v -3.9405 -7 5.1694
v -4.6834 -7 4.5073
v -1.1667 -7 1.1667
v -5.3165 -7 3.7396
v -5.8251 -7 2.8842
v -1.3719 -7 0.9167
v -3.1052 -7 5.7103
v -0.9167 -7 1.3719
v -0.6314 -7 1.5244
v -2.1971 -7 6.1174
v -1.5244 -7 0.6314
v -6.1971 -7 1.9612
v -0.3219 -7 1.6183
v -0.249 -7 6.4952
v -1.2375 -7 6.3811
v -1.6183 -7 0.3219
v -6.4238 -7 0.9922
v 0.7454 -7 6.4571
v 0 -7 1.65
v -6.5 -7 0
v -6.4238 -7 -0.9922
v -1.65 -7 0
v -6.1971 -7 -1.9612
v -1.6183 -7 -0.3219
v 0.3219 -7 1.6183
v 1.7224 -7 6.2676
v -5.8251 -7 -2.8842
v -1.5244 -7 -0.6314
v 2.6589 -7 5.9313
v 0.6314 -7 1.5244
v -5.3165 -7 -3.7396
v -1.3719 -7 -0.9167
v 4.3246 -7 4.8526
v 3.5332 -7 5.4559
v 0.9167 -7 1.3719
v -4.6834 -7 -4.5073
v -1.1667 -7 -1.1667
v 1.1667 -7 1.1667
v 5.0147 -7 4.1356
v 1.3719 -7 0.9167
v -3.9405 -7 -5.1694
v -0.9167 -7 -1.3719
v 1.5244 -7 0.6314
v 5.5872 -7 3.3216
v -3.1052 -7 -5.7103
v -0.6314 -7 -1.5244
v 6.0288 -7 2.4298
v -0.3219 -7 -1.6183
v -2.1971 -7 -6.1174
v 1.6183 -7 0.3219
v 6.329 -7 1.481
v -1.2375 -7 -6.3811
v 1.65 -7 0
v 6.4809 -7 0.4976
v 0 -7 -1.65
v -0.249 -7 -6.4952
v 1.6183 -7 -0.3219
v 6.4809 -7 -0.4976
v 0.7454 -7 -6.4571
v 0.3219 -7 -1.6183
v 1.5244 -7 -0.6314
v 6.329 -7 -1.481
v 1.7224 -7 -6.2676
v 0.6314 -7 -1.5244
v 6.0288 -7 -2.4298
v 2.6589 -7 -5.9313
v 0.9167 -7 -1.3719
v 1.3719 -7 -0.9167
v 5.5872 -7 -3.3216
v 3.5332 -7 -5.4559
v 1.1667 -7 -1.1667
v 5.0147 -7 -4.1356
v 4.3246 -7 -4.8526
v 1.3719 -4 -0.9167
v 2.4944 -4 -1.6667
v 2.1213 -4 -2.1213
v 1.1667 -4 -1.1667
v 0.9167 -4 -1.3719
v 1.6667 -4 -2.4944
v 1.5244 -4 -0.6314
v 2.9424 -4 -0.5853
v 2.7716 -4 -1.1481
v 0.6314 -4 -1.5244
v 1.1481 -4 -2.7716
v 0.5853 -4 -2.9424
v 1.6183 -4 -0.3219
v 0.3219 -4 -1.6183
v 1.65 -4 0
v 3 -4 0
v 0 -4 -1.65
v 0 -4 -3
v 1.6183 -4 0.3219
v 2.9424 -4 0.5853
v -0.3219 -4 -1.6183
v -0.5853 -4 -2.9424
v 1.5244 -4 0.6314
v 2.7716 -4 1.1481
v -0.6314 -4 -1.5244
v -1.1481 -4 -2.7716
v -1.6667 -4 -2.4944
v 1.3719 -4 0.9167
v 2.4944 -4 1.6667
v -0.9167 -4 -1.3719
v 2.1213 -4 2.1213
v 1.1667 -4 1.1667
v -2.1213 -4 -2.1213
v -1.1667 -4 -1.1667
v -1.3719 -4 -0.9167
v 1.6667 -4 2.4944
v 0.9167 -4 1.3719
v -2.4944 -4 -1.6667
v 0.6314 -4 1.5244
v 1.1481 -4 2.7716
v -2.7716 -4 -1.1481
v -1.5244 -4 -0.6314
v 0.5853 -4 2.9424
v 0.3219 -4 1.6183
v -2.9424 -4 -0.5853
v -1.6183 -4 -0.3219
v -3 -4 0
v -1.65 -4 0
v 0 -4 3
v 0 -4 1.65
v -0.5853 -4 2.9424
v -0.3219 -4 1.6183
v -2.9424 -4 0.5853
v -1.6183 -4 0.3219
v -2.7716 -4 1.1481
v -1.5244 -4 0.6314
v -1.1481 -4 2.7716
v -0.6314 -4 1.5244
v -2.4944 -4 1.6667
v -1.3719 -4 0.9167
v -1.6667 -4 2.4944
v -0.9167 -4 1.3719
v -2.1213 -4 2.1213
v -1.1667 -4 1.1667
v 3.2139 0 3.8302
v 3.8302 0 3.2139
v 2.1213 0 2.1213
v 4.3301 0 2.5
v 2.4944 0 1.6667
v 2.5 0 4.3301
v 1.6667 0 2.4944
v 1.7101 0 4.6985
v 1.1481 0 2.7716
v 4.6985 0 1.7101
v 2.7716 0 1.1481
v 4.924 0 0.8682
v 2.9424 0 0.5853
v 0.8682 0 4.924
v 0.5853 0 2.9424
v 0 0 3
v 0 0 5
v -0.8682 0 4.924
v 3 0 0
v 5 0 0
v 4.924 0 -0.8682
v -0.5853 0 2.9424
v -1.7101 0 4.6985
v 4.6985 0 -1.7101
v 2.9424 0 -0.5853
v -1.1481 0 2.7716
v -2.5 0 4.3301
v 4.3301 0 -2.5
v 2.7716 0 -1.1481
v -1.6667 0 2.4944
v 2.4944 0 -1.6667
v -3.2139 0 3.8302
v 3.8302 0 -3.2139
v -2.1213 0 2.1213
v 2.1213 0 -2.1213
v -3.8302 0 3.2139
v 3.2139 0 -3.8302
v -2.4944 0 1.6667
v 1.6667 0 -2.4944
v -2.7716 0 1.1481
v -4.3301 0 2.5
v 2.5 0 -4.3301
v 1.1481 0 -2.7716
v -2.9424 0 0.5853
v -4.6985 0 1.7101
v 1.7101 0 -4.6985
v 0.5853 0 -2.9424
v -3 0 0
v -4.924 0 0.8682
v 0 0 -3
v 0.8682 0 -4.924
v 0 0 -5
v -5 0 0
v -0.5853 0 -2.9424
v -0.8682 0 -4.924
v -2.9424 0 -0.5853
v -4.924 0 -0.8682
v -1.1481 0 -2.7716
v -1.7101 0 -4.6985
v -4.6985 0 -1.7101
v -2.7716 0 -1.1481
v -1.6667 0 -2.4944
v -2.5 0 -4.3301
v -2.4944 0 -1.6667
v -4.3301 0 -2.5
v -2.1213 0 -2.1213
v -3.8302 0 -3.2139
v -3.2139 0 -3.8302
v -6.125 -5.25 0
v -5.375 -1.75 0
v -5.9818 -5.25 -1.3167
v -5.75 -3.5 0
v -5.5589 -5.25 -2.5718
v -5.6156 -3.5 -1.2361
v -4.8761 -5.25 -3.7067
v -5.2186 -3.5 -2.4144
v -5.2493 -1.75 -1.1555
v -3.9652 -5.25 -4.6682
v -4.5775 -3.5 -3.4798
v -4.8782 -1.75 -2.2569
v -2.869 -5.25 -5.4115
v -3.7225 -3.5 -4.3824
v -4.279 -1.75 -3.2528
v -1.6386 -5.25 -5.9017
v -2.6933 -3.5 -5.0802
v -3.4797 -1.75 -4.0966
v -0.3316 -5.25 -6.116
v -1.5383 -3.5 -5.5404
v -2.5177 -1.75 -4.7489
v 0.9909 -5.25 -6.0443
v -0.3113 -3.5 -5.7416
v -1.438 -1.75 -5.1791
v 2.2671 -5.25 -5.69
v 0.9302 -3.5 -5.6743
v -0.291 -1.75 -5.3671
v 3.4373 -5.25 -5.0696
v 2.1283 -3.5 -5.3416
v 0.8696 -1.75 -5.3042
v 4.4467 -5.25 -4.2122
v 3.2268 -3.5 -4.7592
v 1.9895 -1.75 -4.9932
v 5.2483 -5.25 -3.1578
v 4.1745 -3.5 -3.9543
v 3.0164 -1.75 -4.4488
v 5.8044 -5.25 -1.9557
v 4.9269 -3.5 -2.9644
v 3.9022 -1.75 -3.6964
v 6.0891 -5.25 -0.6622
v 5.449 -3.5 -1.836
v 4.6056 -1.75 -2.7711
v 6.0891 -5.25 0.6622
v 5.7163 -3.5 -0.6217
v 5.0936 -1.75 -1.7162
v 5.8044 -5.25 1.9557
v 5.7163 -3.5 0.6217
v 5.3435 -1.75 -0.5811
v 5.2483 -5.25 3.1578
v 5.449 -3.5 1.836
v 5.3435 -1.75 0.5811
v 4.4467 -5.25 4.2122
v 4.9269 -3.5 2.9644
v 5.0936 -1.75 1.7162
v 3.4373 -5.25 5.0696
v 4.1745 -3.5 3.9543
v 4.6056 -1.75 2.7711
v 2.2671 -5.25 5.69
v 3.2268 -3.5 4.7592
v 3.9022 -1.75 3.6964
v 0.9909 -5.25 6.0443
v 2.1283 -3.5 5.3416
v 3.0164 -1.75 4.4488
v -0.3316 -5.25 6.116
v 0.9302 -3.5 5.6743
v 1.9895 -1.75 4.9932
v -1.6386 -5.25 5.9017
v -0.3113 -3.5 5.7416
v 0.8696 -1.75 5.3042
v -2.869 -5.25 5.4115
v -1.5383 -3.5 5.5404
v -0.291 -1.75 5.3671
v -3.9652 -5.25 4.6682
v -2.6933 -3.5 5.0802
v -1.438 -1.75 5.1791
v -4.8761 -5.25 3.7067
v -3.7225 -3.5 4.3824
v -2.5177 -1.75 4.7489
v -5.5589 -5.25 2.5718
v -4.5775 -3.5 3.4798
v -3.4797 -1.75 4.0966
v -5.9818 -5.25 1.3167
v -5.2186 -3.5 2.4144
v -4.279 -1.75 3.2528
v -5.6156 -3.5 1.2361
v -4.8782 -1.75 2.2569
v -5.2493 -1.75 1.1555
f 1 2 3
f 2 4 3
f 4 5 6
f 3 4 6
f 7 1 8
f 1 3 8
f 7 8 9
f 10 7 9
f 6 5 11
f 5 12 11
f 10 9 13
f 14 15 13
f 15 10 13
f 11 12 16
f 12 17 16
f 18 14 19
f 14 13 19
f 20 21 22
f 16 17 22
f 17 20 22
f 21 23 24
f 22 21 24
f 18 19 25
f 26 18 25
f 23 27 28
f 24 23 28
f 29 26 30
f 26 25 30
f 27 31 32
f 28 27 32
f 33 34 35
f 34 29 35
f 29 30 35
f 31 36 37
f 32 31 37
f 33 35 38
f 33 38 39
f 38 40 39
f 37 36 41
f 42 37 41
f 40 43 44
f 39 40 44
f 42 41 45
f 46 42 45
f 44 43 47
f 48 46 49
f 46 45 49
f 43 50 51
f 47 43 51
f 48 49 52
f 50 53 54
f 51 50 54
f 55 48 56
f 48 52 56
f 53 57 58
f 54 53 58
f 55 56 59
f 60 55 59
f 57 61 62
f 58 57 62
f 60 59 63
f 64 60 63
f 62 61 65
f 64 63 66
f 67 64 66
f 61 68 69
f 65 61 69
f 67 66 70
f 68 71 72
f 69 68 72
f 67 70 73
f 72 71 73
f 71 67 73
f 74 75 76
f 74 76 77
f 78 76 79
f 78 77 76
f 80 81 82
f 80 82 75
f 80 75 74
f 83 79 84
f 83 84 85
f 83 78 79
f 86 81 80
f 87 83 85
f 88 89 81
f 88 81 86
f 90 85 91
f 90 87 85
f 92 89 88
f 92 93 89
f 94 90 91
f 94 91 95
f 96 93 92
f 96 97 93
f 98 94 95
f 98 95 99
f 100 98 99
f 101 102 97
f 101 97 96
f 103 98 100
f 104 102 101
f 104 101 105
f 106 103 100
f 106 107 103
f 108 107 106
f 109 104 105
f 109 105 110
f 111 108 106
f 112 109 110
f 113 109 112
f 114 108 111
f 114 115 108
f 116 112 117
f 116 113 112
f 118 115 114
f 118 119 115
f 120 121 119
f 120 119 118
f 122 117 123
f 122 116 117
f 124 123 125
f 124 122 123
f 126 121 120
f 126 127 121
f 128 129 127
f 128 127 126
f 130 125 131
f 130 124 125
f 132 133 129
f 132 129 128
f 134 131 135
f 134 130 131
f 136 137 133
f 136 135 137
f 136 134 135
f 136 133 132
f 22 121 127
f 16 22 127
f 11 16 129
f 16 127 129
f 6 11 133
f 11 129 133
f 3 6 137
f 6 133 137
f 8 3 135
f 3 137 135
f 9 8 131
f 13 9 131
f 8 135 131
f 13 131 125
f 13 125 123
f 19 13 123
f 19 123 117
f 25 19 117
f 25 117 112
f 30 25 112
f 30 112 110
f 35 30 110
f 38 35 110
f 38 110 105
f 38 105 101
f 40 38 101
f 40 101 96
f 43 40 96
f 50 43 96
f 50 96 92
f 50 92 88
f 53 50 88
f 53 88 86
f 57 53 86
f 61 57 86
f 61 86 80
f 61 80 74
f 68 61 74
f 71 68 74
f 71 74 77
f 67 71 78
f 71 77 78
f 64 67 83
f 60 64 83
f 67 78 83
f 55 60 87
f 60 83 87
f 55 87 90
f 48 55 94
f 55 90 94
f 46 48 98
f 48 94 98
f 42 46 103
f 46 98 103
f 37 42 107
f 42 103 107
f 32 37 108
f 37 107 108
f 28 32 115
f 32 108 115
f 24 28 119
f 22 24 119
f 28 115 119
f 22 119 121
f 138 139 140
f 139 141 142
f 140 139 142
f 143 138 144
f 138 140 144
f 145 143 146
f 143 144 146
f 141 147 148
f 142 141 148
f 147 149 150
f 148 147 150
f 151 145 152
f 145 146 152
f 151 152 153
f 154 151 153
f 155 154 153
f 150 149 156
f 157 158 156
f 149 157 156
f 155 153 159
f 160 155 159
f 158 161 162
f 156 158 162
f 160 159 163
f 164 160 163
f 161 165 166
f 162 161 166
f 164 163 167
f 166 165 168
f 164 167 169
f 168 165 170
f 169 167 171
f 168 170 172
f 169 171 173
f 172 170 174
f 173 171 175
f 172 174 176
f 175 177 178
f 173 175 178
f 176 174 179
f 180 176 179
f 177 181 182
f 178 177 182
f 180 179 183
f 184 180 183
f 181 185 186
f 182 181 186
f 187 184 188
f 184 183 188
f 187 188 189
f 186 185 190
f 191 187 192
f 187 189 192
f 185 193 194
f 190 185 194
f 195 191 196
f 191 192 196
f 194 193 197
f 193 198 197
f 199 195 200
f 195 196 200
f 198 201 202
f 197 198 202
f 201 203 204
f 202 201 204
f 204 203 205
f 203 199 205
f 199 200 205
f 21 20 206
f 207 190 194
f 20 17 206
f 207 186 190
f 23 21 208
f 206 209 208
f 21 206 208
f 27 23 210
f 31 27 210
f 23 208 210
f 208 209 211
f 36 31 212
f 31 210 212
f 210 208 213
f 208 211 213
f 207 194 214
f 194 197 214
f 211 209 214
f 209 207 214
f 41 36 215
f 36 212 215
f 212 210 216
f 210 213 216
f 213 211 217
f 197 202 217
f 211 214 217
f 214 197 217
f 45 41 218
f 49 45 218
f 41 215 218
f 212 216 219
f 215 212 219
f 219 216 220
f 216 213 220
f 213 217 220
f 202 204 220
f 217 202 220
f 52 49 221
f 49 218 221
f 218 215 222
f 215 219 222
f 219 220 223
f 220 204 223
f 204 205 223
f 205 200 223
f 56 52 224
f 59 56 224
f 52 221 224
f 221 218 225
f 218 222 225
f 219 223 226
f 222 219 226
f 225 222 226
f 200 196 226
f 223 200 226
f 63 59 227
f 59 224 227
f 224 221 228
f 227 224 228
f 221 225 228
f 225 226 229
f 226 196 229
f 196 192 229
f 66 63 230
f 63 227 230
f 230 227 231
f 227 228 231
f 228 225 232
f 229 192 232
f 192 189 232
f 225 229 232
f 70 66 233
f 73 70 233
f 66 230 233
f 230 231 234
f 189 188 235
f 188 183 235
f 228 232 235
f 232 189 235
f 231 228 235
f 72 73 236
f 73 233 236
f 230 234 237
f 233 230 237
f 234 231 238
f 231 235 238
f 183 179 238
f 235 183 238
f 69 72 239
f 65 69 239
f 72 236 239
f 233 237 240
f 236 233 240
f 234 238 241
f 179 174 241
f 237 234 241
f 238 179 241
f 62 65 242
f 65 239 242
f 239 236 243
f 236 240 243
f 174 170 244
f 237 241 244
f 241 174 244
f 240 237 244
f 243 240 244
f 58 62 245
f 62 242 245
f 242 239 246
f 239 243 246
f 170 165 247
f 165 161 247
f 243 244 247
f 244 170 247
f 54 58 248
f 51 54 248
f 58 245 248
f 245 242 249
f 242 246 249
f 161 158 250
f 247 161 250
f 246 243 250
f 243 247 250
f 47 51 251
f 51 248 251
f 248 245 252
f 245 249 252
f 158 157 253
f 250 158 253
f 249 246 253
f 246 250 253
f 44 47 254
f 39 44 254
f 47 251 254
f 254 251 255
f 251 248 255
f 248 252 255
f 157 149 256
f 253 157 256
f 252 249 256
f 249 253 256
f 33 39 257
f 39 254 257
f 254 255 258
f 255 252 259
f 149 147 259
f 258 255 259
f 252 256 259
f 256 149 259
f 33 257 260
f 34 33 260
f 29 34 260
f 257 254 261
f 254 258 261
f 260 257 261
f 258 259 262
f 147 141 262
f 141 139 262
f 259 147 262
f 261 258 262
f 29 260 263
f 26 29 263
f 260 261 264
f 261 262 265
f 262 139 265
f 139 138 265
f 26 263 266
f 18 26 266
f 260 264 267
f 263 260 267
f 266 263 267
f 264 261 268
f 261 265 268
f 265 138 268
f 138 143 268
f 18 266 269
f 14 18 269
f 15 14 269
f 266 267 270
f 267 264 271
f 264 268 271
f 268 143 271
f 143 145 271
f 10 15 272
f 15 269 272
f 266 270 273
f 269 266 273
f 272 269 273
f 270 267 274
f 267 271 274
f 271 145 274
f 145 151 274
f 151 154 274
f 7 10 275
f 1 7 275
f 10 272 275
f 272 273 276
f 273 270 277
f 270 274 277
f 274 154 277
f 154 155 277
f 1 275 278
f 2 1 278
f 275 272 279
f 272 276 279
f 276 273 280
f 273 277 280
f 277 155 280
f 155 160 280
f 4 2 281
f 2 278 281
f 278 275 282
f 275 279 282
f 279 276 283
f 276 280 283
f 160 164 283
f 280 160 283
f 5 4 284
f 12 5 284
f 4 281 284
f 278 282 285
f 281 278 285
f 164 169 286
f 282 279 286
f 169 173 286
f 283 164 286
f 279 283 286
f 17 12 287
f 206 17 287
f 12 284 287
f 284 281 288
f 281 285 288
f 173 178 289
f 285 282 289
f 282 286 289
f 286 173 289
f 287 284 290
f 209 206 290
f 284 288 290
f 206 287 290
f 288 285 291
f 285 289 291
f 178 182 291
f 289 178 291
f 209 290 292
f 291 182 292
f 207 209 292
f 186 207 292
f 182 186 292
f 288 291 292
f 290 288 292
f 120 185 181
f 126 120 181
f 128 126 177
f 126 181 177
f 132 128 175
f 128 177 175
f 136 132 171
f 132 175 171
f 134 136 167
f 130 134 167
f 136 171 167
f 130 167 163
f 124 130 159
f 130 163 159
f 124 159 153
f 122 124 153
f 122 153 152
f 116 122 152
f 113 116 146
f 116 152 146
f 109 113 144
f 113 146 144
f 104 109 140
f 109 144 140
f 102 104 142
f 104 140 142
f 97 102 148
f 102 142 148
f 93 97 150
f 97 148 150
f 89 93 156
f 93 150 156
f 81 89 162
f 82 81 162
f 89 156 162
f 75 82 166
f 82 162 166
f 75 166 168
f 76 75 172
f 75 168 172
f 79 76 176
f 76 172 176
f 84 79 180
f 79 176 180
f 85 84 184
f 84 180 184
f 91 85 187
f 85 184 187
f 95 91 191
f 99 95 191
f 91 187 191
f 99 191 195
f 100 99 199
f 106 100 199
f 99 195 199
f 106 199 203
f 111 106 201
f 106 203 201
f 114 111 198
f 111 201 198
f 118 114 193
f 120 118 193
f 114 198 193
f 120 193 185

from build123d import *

# Parameters (mm, degrees)
SKETCH2_R          = 1.65
CUT_EXTRUDE1_DEPTH = 10
SKETCH3_R          = 3
CUT_EXTRUDE2_DEPTH = 4


with BuildPart() as part:
    # Sketch1 → Revolve1 (revolve)
    with BuildSketch(Plane.XY, mode=Mode.PRIVATE) as revolve1_sk:
        Polygon((0, -7), (6.5, -7), (5, 0), (0, 0), align=None)
    revolve(revolve1_sk.sketch.rotate(Axis((0, 0, 0), (0, -1, 0)), 180), axis=Axis((0, 0, 0), (0, -1, 0)))

    # Sketch2 → Cut-Extrude1 (cut)
    with BuildSketch(Plane(origin=(0, 0, 0), x_dir=(1, 0, 0), z_dir=(0, 1, 0))):
        with Locations(Location((0, 0, 0), (0, 0, 180))):
            Circle(SKETCH2_R)
    extrude(amount=-CUT_EXTRUDE1_DEPTH, mode=Mode.SUBTRACT)

    # Sketch3 → Cut-Extrude2 (cut)
    with BuildSketch(Plane(origin=(0, 0, 0), x_dir=(1, 0, 0), z_dir=(0, 1, 0))):
        with Locations(Location((0, 0, 0), (0, 0, 180))):
            Circle(SKETCH3_R)
    extrude(amount=-CUT_EXTRUDE2_DEPTH, mode=Mode.SUBTRACT)


solid = part.part
